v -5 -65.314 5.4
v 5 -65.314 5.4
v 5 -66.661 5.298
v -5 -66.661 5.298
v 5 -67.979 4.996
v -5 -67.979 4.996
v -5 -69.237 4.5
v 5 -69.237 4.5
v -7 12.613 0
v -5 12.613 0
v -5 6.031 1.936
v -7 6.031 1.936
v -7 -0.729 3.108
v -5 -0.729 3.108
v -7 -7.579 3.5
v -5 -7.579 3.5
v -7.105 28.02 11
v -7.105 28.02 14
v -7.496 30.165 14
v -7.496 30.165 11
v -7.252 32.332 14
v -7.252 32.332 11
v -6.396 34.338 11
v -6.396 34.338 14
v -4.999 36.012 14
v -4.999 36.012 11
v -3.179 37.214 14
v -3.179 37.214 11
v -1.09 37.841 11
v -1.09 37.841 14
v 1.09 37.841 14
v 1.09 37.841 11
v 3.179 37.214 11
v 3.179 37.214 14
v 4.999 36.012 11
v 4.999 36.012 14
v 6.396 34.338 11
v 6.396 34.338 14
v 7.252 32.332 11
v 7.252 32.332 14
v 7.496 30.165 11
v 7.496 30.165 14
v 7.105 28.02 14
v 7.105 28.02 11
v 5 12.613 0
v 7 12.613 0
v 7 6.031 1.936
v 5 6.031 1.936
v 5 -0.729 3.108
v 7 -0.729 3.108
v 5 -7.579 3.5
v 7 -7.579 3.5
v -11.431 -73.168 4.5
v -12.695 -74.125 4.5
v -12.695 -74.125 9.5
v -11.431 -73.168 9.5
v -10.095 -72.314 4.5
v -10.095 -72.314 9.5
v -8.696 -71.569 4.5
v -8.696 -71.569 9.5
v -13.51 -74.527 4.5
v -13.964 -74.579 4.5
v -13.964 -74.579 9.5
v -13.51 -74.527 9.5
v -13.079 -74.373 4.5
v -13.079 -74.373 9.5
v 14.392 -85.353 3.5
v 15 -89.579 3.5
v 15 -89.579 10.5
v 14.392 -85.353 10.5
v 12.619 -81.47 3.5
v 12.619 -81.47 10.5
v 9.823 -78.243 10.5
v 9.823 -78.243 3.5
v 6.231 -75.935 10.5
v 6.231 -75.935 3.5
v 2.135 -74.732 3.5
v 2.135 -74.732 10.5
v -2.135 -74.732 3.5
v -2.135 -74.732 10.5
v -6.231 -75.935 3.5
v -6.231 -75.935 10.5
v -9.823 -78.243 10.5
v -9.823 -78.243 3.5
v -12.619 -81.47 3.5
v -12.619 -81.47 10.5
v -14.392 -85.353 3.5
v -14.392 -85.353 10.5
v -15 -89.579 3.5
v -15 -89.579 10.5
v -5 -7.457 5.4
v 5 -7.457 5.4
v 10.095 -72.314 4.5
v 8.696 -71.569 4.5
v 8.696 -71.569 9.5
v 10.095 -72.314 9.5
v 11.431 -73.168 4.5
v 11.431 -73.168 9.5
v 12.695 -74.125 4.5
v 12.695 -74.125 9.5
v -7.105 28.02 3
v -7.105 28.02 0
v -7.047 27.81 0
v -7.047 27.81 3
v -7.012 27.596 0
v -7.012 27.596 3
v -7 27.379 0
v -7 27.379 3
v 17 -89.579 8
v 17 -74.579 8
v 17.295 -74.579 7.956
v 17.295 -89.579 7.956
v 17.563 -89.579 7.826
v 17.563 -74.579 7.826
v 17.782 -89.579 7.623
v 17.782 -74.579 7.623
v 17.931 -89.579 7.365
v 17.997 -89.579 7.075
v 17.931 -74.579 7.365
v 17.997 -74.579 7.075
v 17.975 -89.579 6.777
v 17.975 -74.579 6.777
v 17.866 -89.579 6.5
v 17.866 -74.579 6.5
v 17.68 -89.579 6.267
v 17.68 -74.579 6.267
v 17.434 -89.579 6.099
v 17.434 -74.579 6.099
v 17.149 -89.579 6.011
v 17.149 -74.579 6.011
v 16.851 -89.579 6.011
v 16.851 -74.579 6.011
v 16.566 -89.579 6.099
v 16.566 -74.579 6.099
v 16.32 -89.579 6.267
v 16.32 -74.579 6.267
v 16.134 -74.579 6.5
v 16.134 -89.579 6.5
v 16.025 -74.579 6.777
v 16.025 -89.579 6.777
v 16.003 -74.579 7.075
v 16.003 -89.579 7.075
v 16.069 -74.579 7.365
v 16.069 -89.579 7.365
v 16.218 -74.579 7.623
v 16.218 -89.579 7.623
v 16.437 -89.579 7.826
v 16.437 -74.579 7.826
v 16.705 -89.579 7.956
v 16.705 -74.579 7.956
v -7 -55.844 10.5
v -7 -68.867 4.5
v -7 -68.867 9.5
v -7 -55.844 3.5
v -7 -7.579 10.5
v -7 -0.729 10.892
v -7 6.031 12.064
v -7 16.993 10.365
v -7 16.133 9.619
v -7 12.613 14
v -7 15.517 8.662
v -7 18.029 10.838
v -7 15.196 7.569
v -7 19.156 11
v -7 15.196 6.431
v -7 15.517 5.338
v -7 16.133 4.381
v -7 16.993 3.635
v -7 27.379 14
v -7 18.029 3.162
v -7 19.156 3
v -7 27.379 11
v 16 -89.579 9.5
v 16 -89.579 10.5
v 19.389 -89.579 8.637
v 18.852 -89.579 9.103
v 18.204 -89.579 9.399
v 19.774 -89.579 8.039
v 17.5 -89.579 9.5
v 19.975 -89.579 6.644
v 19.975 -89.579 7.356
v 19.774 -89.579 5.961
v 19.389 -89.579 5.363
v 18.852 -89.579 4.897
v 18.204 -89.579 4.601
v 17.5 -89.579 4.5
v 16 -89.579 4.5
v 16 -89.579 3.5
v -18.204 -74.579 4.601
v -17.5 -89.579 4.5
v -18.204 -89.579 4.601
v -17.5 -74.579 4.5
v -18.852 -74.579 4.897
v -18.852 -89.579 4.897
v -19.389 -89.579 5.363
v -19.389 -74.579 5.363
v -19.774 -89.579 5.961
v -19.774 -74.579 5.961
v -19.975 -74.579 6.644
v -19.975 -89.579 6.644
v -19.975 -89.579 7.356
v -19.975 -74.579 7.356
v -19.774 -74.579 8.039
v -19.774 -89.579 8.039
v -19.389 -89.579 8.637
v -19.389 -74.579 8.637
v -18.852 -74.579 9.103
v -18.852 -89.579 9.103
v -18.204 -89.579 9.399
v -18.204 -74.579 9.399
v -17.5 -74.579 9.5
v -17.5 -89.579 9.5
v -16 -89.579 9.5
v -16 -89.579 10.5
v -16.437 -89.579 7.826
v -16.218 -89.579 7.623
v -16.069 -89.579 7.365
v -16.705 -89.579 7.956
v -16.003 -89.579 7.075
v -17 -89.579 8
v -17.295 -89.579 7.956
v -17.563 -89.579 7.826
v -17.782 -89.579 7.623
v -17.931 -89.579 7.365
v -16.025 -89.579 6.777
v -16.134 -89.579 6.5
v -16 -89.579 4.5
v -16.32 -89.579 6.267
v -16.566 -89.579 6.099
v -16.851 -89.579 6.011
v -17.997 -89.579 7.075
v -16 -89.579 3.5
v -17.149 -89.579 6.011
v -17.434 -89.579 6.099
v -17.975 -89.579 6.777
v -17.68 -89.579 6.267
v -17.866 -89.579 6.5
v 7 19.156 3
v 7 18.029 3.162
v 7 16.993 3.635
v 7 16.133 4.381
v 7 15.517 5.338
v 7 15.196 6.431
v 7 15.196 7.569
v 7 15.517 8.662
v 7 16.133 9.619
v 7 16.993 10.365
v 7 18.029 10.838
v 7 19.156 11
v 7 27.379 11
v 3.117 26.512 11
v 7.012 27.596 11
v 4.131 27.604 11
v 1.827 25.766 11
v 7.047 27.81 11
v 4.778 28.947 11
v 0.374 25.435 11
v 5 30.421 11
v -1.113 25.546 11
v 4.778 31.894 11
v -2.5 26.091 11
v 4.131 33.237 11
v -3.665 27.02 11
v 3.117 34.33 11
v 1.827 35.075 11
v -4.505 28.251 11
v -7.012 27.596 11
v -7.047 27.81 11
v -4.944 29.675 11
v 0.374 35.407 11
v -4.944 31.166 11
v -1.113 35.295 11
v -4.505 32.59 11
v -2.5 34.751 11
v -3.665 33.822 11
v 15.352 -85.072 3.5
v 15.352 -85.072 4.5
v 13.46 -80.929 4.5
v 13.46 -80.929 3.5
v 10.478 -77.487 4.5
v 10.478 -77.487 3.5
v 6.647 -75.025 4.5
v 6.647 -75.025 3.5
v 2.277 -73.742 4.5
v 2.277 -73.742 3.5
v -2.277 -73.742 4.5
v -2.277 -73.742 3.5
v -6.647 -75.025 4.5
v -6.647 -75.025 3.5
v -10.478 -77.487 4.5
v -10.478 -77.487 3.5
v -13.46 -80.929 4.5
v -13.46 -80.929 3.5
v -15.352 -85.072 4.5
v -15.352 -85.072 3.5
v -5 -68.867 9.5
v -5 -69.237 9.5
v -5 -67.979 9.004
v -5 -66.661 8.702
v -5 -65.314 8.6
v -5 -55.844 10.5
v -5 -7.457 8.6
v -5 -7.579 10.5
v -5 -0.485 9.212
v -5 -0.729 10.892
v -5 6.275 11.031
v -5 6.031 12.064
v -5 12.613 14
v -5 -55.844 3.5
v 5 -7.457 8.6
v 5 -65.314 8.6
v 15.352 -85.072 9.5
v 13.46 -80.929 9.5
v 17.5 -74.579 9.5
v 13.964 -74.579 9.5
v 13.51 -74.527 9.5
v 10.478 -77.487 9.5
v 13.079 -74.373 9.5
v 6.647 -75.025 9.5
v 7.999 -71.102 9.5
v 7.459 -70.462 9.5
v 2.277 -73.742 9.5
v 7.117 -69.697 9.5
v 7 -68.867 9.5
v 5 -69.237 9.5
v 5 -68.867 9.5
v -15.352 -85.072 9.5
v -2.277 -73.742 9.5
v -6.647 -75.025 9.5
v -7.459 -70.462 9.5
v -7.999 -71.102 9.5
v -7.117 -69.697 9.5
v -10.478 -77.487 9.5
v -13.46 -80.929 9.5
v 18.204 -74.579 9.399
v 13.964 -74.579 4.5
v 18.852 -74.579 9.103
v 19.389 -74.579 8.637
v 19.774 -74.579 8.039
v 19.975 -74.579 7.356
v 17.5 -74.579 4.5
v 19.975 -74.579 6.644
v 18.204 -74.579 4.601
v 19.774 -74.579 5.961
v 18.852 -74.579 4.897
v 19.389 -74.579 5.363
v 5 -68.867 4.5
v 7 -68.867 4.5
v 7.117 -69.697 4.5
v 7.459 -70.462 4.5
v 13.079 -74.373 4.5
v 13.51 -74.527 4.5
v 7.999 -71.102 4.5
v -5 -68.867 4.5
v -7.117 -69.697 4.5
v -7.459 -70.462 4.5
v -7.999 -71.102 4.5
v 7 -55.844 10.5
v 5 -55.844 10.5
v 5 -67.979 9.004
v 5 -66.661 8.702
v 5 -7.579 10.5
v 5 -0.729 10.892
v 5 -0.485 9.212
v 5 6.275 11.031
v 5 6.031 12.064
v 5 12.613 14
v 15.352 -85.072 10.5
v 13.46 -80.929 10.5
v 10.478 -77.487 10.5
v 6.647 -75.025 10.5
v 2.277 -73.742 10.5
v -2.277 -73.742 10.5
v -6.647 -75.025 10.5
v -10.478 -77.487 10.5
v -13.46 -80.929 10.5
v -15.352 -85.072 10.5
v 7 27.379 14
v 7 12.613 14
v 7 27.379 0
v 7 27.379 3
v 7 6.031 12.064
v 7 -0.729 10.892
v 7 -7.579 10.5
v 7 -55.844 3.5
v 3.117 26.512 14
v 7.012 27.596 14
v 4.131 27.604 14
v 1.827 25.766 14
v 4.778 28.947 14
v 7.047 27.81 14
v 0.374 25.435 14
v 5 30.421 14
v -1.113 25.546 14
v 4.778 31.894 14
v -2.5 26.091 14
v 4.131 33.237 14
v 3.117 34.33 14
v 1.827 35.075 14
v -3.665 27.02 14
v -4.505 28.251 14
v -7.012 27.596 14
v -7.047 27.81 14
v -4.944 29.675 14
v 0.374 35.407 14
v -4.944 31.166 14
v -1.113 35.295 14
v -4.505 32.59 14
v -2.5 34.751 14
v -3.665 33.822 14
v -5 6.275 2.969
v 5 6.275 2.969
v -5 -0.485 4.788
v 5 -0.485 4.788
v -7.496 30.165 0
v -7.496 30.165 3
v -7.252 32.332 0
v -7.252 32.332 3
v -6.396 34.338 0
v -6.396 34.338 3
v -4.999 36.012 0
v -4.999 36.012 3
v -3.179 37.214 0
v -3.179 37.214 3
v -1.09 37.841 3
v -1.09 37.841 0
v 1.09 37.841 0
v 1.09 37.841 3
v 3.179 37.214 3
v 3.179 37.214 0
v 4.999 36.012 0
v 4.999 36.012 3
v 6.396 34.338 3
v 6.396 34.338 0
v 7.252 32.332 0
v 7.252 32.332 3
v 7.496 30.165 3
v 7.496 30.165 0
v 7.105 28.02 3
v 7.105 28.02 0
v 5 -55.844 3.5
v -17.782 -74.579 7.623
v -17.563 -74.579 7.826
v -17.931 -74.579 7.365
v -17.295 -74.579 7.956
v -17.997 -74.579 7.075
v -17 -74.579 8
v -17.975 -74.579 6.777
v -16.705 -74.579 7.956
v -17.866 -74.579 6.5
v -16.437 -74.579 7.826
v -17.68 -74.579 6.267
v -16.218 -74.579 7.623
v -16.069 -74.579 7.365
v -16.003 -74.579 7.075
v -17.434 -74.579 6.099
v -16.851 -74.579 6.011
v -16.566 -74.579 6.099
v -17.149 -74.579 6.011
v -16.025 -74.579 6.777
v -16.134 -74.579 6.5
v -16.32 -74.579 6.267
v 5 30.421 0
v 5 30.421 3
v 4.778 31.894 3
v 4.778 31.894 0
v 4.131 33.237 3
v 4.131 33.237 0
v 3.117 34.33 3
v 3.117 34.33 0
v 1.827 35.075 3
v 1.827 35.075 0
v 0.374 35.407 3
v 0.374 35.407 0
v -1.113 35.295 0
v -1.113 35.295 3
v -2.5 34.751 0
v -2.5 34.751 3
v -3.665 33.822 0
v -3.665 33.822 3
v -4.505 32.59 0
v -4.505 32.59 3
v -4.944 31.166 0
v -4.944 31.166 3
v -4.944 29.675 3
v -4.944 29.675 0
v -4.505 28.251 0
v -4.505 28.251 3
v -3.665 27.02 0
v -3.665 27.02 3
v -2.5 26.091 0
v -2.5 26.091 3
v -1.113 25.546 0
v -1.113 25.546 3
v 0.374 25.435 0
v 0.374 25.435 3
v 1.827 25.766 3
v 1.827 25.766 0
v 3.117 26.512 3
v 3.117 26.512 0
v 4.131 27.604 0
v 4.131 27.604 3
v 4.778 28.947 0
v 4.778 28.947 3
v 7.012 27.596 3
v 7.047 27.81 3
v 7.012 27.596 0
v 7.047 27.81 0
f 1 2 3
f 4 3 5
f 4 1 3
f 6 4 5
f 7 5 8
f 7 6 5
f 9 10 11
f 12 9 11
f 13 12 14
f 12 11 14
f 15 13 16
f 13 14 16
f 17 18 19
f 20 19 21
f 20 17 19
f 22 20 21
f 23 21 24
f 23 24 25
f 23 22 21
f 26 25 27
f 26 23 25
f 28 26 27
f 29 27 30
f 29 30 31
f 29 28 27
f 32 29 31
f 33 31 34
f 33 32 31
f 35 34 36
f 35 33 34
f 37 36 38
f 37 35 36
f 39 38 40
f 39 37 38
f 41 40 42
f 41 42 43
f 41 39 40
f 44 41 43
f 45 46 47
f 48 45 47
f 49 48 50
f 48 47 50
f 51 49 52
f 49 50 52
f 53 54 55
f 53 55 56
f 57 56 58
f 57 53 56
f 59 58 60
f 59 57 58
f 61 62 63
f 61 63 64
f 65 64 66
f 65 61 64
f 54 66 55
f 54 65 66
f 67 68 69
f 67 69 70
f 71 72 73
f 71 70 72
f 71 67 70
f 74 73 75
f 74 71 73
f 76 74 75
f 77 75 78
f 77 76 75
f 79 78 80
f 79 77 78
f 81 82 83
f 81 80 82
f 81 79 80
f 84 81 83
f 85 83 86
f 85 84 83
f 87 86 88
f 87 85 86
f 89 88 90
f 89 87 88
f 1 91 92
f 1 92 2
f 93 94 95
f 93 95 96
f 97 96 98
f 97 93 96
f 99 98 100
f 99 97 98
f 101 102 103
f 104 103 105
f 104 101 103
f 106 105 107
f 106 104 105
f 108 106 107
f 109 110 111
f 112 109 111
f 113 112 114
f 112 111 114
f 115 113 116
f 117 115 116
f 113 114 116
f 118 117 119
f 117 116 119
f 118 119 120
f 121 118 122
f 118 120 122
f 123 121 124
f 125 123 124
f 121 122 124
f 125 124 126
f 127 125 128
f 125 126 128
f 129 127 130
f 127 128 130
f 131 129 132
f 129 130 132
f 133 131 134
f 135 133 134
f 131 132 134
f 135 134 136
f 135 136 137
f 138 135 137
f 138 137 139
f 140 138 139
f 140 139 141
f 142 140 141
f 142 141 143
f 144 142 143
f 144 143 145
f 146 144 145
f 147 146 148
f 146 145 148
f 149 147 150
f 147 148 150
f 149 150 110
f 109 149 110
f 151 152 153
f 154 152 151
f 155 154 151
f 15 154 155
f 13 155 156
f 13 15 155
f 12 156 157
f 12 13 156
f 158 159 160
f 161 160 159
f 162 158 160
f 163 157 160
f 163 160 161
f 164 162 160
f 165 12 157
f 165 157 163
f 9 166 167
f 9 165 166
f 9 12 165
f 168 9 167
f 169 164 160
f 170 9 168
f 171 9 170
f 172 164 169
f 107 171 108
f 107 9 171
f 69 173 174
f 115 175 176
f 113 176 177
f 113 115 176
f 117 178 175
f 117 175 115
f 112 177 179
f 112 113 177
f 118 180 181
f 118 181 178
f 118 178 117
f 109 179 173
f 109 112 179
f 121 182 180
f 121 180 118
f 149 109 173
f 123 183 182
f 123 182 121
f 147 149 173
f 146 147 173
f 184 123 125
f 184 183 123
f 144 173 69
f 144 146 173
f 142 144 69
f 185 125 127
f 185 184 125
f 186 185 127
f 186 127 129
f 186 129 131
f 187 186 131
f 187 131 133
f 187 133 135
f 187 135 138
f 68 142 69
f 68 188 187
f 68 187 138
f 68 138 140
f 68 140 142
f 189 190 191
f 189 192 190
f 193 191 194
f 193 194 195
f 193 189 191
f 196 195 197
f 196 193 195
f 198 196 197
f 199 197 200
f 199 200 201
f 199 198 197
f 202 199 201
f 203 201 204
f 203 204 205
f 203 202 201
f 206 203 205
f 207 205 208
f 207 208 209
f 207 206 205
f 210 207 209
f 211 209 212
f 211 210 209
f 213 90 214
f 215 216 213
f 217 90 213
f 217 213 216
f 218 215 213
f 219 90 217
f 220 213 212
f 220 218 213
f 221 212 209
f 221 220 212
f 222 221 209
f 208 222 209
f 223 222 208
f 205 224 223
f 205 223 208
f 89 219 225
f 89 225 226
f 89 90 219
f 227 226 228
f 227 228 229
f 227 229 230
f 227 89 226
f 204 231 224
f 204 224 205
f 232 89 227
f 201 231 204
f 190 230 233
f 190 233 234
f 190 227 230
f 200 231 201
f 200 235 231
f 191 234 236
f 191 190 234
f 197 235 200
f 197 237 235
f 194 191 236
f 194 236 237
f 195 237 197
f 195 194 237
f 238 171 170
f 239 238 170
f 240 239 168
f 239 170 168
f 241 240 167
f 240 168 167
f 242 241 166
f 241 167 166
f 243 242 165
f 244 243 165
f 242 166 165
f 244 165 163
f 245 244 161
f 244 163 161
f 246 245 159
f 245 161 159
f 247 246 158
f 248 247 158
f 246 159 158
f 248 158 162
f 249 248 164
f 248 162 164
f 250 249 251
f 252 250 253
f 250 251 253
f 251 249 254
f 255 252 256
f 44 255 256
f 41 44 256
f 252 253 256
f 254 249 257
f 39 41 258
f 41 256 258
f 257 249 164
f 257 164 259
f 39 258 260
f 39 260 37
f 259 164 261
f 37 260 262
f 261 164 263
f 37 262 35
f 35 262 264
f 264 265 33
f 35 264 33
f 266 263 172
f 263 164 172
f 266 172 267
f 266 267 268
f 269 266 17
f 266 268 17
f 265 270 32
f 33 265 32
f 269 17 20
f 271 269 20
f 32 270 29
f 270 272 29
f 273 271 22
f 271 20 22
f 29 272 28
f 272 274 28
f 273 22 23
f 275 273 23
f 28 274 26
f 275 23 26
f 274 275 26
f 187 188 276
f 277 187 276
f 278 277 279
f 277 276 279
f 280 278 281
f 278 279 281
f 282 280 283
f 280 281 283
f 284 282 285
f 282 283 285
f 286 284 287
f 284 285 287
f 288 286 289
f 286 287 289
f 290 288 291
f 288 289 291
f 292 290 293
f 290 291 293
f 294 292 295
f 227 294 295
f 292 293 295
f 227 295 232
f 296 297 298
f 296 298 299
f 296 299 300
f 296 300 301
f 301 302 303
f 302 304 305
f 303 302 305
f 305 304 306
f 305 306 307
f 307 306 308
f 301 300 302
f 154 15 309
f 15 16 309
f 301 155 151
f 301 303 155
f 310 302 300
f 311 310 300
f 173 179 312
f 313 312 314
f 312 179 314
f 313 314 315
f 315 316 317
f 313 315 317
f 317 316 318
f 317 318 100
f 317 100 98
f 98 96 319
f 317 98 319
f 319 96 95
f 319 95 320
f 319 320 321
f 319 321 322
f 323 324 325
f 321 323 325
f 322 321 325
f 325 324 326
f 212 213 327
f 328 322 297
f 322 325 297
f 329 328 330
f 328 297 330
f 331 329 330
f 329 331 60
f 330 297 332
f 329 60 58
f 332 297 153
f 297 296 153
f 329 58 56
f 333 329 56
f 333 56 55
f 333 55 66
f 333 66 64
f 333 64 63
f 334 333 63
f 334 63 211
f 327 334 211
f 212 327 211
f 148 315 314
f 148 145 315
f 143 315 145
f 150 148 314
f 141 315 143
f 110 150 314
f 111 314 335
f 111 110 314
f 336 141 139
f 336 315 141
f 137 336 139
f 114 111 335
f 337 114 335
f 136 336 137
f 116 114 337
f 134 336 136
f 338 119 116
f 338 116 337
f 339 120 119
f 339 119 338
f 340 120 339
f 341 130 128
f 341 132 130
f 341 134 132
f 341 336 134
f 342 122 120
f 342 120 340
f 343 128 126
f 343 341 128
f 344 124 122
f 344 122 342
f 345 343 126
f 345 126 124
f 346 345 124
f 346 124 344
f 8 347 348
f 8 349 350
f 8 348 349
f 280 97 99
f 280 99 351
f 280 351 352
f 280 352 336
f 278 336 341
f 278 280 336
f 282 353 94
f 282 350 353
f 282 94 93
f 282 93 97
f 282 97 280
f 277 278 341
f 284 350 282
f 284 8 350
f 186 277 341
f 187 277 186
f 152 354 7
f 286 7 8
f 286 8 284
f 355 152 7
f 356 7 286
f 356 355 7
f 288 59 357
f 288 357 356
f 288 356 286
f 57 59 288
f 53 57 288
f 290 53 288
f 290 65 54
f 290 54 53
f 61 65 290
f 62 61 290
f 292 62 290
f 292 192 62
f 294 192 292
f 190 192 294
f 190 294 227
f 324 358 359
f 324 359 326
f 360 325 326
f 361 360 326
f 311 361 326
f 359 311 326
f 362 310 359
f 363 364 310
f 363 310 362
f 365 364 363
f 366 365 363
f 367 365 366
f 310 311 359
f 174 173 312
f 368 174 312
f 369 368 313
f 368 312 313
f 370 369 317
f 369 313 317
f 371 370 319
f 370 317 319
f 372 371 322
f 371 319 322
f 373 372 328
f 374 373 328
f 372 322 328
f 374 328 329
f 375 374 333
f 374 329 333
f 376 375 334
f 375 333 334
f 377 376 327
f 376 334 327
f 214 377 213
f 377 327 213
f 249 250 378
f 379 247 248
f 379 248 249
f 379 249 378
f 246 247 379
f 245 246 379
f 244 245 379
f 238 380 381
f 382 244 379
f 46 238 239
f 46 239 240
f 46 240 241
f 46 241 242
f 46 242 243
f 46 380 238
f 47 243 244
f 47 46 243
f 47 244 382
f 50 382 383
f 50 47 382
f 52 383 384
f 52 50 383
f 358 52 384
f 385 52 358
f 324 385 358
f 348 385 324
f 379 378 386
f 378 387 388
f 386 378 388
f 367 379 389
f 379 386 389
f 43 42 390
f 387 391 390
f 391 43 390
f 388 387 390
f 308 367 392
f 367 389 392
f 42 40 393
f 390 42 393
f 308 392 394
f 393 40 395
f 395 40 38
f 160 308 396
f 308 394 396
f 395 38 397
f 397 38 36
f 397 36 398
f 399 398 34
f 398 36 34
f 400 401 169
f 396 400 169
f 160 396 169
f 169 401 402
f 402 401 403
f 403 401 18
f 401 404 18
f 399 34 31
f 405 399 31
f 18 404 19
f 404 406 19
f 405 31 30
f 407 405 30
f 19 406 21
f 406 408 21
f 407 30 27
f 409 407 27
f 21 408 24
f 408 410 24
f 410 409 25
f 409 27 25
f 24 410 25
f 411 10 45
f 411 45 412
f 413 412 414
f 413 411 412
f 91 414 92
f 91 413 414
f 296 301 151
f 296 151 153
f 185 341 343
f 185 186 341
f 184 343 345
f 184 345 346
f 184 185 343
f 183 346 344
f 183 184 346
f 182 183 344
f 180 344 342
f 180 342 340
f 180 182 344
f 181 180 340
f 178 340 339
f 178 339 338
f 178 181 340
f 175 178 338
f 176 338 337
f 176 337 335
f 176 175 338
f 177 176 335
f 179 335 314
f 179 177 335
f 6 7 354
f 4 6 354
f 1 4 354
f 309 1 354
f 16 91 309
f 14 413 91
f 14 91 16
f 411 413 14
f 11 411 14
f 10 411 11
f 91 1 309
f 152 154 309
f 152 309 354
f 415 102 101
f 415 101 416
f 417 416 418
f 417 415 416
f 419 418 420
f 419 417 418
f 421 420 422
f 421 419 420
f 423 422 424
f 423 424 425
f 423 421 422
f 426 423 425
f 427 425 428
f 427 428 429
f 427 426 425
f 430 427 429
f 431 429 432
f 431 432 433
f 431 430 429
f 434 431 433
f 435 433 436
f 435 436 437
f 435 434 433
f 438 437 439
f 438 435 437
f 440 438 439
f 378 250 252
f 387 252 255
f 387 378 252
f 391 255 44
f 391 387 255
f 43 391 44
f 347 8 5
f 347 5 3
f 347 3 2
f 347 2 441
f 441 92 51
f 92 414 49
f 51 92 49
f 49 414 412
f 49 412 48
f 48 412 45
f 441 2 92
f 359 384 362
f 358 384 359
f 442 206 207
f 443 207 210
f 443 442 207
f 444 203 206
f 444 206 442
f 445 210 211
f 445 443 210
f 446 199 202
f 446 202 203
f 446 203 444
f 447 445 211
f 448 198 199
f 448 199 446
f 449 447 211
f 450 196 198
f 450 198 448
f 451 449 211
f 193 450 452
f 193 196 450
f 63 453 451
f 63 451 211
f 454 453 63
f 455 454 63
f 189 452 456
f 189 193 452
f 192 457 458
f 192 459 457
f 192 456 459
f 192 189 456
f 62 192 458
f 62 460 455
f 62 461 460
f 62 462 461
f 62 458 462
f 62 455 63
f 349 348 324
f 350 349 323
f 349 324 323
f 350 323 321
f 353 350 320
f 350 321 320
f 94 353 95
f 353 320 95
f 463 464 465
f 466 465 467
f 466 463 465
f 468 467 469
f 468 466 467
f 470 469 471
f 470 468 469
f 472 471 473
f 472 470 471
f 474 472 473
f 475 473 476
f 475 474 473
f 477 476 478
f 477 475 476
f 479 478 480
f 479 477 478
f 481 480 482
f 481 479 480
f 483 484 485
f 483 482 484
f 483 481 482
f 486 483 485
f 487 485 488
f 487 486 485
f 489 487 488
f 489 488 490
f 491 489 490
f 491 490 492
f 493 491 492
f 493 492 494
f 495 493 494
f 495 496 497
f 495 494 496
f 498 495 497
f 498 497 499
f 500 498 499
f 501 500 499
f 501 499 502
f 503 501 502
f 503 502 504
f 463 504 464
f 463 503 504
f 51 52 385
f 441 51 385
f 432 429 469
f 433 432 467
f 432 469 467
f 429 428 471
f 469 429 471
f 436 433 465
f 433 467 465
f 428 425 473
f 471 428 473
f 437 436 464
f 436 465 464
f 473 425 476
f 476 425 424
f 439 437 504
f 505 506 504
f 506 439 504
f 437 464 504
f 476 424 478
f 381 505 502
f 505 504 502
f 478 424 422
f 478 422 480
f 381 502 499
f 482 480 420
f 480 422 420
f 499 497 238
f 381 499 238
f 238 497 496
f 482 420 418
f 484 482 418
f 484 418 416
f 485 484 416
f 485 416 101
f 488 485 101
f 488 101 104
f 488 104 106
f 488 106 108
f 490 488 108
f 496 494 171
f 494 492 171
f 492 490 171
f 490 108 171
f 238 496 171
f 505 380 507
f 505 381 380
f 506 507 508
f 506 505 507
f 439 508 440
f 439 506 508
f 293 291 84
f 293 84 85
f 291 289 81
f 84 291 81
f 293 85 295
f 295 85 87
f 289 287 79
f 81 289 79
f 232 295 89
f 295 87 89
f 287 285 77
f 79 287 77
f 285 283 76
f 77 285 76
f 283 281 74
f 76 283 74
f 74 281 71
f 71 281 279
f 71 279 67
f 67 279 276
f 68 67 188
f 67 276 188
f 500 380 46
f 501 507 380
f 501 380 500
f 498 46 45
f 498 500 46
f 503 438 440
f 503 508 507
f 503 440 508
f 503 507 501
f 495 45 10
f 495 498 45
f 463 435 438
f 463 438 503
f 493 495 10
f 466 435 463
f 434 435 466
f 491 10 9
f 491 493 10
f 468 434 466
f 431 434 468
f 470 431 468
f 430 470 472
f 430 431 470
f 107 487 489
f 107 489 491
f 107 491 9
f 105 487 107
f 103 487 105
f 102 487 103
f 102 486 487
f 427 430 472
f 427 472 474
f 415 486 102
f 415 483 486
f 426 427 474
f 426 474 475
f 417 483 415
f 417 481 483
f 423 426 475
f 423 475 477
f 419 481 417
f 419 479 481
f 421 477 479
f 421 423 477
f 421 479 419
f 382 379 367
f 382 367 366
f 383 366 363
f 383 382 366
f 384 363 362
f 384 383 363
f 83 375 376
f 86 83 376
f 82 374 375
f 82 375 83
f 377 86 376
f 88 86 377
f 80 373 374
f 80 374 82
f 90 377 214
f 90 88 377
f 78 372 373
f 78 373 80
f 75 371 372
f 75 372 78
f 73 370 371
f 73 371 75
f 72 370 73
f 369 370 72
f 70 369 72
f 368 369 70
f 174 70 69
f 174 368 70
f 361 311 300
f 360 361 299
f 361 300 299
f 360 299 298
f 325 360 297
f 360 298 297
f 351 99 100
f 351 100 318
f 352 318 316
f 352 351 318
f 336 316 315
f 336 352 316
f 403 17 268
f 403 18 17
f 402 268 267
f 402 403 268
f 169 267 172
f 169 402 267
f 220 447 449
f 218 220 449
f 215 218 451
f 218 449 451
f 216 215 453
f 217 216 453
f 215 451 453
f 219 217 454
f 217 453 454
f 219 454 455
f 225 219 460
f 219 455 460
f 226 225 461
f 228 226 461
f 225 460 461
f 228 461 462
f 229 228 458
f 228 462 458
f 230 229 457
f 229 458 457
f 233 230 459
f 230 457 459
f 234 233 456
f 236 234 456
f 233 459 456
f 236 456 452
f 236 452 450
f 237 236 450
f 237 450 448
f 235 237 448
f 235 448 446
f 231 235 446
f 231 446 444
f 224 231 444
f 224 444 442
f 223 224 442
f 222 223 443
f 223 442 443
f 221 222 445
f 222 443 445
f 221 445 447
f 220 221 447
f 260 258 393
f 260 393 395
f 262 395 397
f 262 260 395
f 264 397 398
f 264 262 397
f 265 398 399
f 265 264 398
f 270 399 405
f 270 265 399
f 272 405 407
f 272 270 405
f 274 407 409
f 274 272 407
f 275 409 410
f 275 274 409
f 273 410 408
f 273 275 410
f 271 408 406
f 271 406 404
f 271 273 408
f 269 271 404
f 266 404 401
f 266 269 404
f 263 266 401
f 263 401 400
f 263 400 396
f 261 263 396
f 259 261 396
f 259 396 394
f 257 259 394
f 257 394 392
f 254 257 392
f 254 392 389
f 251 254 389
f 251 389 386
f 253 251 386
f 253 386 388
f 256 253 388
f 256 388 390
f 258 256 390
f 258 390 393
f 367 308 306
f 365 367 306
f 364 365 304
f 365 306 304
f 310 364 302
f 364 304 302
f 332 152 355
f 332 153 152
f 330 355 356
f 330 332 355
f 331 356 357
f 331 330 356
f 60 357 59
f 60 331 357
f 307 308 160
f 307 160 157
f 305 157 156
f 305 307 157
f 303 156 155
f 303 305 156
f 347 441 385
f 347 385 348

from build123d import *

# Parameters (mm, degrees)
SKETCH1_R               = 5
BOSS_EXTRUDE1_DEPTH     = 14
CUT_EXTRUDE1_DEPTH      = 14
CUT_EXTRUDE1_DEPTH_BACK = 21
CUT_EXTRUDE2_DEPTH      = 26
CUT_EXTRUDE2_DEPTH_BACK = 28
CUT_EXTRUDE3_DEPTH      = 5
CUT_EXTRUDE3_DEPTH_BACK = 5
CUT_EXTRUDE4_START      = -1
CUT_EXTRUDE4_DEPTH      = 1
CUT_EXTRUDE6_START      = -7
CUT_EXTRUDE6_DEPTH      = 1
SKETCH8_R               = 1
CUT_EXTRUDE8_DEPTH      = 15
FILLET2_RADIUS          = 2.5
FILLET2_LENGTH          = 15
FILLET3_RADIUS          = 2.5
FILLET3_LENGTH          = 15
FILLET4_R               = 3
FILLET5_R               = 2
CUT_EXTRUDE9_DEPTH      = 95.601560752
CUT_EXTRUDE9_DEPTH_BACK = 22
CUT_EXTRUDE10_DEPTH     = 19


with BuildPart() as part:
    # Sketch1 → Boss-Extrude1 (new body)
    with BuildSketch(Plane.XY):
        with BuildLine():
            Line((7, 27.728093549), (7, -70.844330052))
            ThreePointArc((7, -70.844330052), (9.983048869, -72.249040285), (12.694763676, -74.124778593))
            ThreePointArc((12.694763676, -74.124778593), (13.290040181, -74.462261791), (13.964240044, -74.579324047))
            Line((13.964240044, -74.579324047), (20, -74.579324047))
            Line((20, -74.579324047), (20, -89.579324047))
            Line((20, -89.579324047), (15, -89.579324047))
            ThreePointArc((15, -89.579324047), (0, -74.579324047), (-15, -89.579324047))
            Line((-15, -89.579324047), (-20, -89.579324047))
            Line((-20, -89.579324047), (-20, -74.579324047))
            Line((-20, -74.579324047), (-13.964240044, -74.579324047))
            ThreePointArc((-13.964240044, -74.579324047), (-13.290040181, -74.462261791), (-12.694763676, -74.124778593))
            ThreePointArc((-12.694763676, -74.124778593), (-9.983048869, -72.249040285), (-7, -70.844330052))
            Line((-7, -70.844330052), (-7, 27.728093549))
            ThreePointArc((-7, 27.728093549), (0, 37.920675953), (7, 27.728093549))
        make_face()
        with Locations((0, 30.420675953)):
            Circle(SKETCH1_R, mode=Mode.SUBTRACT)
    extrude(amount=BOSS_EXTRUDE1_DEPTH)

    # Sketch2 → Cut-Extrude1 (cut, two sides: drawn at the far end of the back side and taken through both)
    with BuildSketch(Plane(origin=(7, 0, 0), x_dir=(0, 0, -1), z_dir=(1, 0, 0)).offset(-CUT_EXTRUDE1_DEPTH_BACK)):
        with BuildLine():
            Line((-11, 19.155669948), (-11, 94.026923789))
            Line((-11, 94.026923789), (-3, 94.026923789))
            Line((-3, 94.026923789), (-3, 19.155669948))
            ThreePointArc((-3, 19.155669948), (-7, 15.155669948), (-11, 19.155669948))
        make_face()
    extrude(amount=CUT_EXTRUDE1_DEPTH + CUT_EXTRUDE1_DEPTH_BACK, mode=Mode.SUBTRACT)

    # Sketch3 → Cut-Extrude2 (cut, two sides: drawn at the far end of the back side and taken through both)
    with BuildSketch(Plane.ZY.offset(7).offset(-CUT_EXTRUDE2_DEPTH_BACK)):
        with BuildLine():
            Line((3.5, -7.579324047), (3.5, -89.579324047))
            Line((3.5, -89.579324047), (0, -89.579324047))
            Line((0, -89.579324047), (0, 12.613496459))
            ThreePointArc((0, 12.613496459), (2.618525015, 2.667626719), (3.5, -7.579324047))
        make_face()
        with BuildLine():
            Line((10.5, -7.579324047), (10.5, -89.579324047))
            Line((10.5, -89.579324047), (14, -89.579324047))
            Line((14, -89.579324047), (14, 12.613496459))
            ThreePointArc((14, 12.613496459), (11.381474985, 2.667626719), (10.5, -7.579324047))
        make_face()
    extrude(amount=CUT_EXTRUDE2_DEPTH + CUT_EXTRUDE2_DEPTH_BACK, mode=Mode.SUBTRACT)

    # Sketch4 → Cut-Extrude3 (cut, two sides: drawn at the far end of the back side and taken through both)
    with BuildSketch(Plane(origin=(0, 0, 0), x_dir=(0, 0, -1), z_dir=(1, 0, 0)).offset(-CUT_EXTRUDE3_DEPTH_BACK)):
        with BuildLine():
            Line((-5.4, -7.457377961), (-5.4, -65.313507329))
            ThreePointArc((-5.4, -65.313507329), (-4.911756575, -68.237545632), (-3.5, -70.844330052))
            Line((-3.5, -70.844330052), (19.637557059, -70.844330052))
            Line((19.637557059, -70.844330052), (19.637557059, 12.613496459))
            Line((19.637557059, 12.613496459), (0, 12.613496459))
            ThreePointArc((0, 12.613496459), (-4.026415832, 2.934926884), (-5.4, -7.457377961))
        make_face()
        with BuildLine():
            Line((-8.6, -7.457377961), (-8.6, -65.313507329))
            ThreePointArc((-8.6, -65.313507329), (-9.088243425, -68.237545632), (-10.5, -70.844330052))
            Line((-10.5, -70.844330052), (-24.530573049, -70.844330052))
            Line((-24.530573049, -70.844330052), (-24.530573049, 12.613496459))
            Line((-24.530573049, 12.613496459), (-14, 12.613496459))
            ThreePointArc((-14, 12.613496459), (-9.973584168, 2.934926884), (-8.6, -7.457377961))
        make_face()
    extrude(amount=CUT_EXTRUDE3_DEPTH + CUT_EXTRUDE3_DEPTH_BACK, mode=Mode.SUBTRACT)

    # Sketch5 → Cut-Extrude4 (cut)
    with BuildSketch(Plane.XY.offset(10.5).offset(CUT_EXTRUDE4_START)):
        with BuildLine():
            Line((-16, -89.579324047), (-20, -89.579324047))
            Line((-20, -89.579324047), (-20, -74.579324047))
            Line((-20, -74.579324047), (-13.964240044, -74.579324047))
            ThreePointArc((-13.964240044, -74.579324047), (-13.290040181, -74.462261791), (-12.694763676, -74.124778593))
            ThreePointArc((-12.694763676, -74.124778593), (0, -69.579324047), (12.694763676, -74.124778593))
            ThreePointArc((12.694763676, -74.124778593), (13.290040181, -74.462261791), (13.964240044, -74.579324047))
            Line((13.964240044, -74.579324047), (20, -74.579324047))
            Line((20, -74.579324047), (20, -89.579324047))
            Line((20, -89.579324047), (16, -89.579324047))
            ThreePointArc((16, -89.579324047), (0, -73.579324047), (-16, -89.579324047))
        make_face()
    extrude(amount=CUT_EXTRUDE4_DEPTH, mode=Mode.SUBTRACT)

    # Sketch5<3> → Cut-Extrude6 (cut)
    with BuildSketch(Plane.XY.offset(10.5).offset(CUT_EXTRUDE6_START)):
        with BuildLine():
            Line((-16, -89.579324047), (-20, -89.579324047))
            Line((-20, -89.579324047), (-20, -74.579324047))
            Line((-20, -74.579324047), (-13.964240044, -74.579324047))
            ThreePointArc((-13.964240044, -74.579324047), (-13.290040181, -74.462261791), (-12.694763676, -74.124778593))
            ThreePointArc((-12.694763676, -74.124778593), (0, -69.579324047), (12.694763676, -74.124778593))
            ThreePointArc((12.694763676, -74.124778593), (13.290040181, -74.462261791), (13.964240044, -74.579324047))
            Line((13.964240044, -74.579324047), (20, -74.579324047))
            Line((20, -74.579324047), (20, -89.579324047))
            Line((20, -89.579324047), (16, -89.579324047))
            ThreePointArc((16, -89.579324047), (0, -73.579324047), (-16, -89.579324047))
        make_face()
    extrude(amount=CUT_EXTRUDE6_DEPTH, mode=Mode.SUBTRACT)

    # Sketch8 → Cut-Extrude8 (cut)
    with BuildSketch(Plane(origin=(0, -74.579324047, 0), x_dir=(1, 0, 0), z_dir=(0, 1, 0))):
        with Locations(Location((17, -7, 0), (0, 0, 270))):
            Circle(SKETCH8_R)
        with Locations(Location((-17, -7, 0), (0, 0, 270))):
            Circle(SKETCH8_R)
    extrude(amount=-CUT_EXTRUDE8_DEPTH, mode=Mode.SUBTRACT)

    # Fillet2: full round fillet: the end face becomes a half cylinder, R = half its width
    fillet2_face = Plane((-20, -82.079324047, 7), x_dir=(0, 1, 0), z_dir=(-1, 0, 0))  # on the end face: x along it, z out of the body
    fillet2_slab = fillet2_face.offset(-FILLET2_RADIUS / 2) * Box(FILLET2_LENGTH, 2 * FILLET2_RADIUS, FILLET2_RADIUS, mode=Mode.PRIVATE)  # the body's end, R deep
    fillet2_round = Plane((-17.5, -82.079324047, 7), x_dir=(-1, 0, 0), z_dir=(0, 1, 0)) * Cylinder(FILLET2_RADIUS, FILLET2_LENGTH, mode=Mode.PRIVATE)  # its axis R under the face
    add(fillet2_slab - fillet2_round, mode=Mode.SUBTRACT)

    # Fillet3: full round fillet: the end face becomes a half cylinder, R = half its width
    fillet3_face = Plane((20, -82.079324047, 7), x_dir=(0, -1, 0), z_dir=(1, 0, 0))  # on the end face: x along it, z out of the body
    fillet3_slab = fillet3_face.offset(-FILLET3_RADIUS / 2) * Box(FILLET3_LENGTH, 2 * FILLET3_RADIUS, FILLET3_RADIUS, mode=Mode.PRIVATE)  # the body's end, R deep
    fillet3_round = Plane((17.5, -82.079324047, 7), x_dir=(1, 0, 0), z_dir=(0, -1, 0)) * Cylinder(FILLET3_RADIUS, FILLET3_LENGTH, mode=Mode.PRIVATE)  # its axis R under the face
    add(fillet3_slab - fillet3_round, mode=Mode.SUBTRACT)

    # Fillet4
    fillet4_edges = [part.edges().sort_by_distance(p)[0] for p in [
        (-7, -70.844330052, 7),
        (7, -70.844330052, 7),
    ]]
    fillet(fillet4_edges, radius=FILLET4_R)

    # Fillet5
    fillet5_edges = [part.edges().sort_by_distance(p)[0] for p in [
        (-7, 27.728093549, 12.5),
        (7, 27.728093549, 12.5),
        (-7, 27.728093549, 1.5),
        (7, 27.728093549, 1.5),
    ]]
    fillet(fillet5_edges, radius=FILLET5_R)

    # Sketch10 → Cut-Extrude9 (cut, two sides: drawn at the far end of the back side and taken through both)
    with BuildSketch(Plane(origin=(7, 0, 0), x_dir=(0, 0, -1), z_dir=(1, 0, 0)).offset(-CUT_EXTRUDE9_DEPTH_BACK)):
        Polygon((-3.5, -55.844330052), (-4.5, -68.86700887), (-4.5, -70.844330052), (-3.5, -70.844330052), align=None)
    extrude(amount=CUT_EXTRUDE9_DEPTH + CUT_EXTRUDE9_DEPTH_BACK, mode=Mode.SUBTRACT)

    # Sketch11 → Cut-Extrude10 (cut)
    with BuildSketch(Plane(origin=(7, 0, 0), x_dir=(0, 0, -1), z_dir=(1, 0, 0))):
        Polygon((-9.5, -70.844330052), (-10.5, -70.844330052), (-10.5, -55.844330052), (-9.5, -68.86700887), align=None)
    extrude(amount=-CUT_EXTRUDE10_DEPTH, mode=Mode.SUBTRACT)


solid = part.part
